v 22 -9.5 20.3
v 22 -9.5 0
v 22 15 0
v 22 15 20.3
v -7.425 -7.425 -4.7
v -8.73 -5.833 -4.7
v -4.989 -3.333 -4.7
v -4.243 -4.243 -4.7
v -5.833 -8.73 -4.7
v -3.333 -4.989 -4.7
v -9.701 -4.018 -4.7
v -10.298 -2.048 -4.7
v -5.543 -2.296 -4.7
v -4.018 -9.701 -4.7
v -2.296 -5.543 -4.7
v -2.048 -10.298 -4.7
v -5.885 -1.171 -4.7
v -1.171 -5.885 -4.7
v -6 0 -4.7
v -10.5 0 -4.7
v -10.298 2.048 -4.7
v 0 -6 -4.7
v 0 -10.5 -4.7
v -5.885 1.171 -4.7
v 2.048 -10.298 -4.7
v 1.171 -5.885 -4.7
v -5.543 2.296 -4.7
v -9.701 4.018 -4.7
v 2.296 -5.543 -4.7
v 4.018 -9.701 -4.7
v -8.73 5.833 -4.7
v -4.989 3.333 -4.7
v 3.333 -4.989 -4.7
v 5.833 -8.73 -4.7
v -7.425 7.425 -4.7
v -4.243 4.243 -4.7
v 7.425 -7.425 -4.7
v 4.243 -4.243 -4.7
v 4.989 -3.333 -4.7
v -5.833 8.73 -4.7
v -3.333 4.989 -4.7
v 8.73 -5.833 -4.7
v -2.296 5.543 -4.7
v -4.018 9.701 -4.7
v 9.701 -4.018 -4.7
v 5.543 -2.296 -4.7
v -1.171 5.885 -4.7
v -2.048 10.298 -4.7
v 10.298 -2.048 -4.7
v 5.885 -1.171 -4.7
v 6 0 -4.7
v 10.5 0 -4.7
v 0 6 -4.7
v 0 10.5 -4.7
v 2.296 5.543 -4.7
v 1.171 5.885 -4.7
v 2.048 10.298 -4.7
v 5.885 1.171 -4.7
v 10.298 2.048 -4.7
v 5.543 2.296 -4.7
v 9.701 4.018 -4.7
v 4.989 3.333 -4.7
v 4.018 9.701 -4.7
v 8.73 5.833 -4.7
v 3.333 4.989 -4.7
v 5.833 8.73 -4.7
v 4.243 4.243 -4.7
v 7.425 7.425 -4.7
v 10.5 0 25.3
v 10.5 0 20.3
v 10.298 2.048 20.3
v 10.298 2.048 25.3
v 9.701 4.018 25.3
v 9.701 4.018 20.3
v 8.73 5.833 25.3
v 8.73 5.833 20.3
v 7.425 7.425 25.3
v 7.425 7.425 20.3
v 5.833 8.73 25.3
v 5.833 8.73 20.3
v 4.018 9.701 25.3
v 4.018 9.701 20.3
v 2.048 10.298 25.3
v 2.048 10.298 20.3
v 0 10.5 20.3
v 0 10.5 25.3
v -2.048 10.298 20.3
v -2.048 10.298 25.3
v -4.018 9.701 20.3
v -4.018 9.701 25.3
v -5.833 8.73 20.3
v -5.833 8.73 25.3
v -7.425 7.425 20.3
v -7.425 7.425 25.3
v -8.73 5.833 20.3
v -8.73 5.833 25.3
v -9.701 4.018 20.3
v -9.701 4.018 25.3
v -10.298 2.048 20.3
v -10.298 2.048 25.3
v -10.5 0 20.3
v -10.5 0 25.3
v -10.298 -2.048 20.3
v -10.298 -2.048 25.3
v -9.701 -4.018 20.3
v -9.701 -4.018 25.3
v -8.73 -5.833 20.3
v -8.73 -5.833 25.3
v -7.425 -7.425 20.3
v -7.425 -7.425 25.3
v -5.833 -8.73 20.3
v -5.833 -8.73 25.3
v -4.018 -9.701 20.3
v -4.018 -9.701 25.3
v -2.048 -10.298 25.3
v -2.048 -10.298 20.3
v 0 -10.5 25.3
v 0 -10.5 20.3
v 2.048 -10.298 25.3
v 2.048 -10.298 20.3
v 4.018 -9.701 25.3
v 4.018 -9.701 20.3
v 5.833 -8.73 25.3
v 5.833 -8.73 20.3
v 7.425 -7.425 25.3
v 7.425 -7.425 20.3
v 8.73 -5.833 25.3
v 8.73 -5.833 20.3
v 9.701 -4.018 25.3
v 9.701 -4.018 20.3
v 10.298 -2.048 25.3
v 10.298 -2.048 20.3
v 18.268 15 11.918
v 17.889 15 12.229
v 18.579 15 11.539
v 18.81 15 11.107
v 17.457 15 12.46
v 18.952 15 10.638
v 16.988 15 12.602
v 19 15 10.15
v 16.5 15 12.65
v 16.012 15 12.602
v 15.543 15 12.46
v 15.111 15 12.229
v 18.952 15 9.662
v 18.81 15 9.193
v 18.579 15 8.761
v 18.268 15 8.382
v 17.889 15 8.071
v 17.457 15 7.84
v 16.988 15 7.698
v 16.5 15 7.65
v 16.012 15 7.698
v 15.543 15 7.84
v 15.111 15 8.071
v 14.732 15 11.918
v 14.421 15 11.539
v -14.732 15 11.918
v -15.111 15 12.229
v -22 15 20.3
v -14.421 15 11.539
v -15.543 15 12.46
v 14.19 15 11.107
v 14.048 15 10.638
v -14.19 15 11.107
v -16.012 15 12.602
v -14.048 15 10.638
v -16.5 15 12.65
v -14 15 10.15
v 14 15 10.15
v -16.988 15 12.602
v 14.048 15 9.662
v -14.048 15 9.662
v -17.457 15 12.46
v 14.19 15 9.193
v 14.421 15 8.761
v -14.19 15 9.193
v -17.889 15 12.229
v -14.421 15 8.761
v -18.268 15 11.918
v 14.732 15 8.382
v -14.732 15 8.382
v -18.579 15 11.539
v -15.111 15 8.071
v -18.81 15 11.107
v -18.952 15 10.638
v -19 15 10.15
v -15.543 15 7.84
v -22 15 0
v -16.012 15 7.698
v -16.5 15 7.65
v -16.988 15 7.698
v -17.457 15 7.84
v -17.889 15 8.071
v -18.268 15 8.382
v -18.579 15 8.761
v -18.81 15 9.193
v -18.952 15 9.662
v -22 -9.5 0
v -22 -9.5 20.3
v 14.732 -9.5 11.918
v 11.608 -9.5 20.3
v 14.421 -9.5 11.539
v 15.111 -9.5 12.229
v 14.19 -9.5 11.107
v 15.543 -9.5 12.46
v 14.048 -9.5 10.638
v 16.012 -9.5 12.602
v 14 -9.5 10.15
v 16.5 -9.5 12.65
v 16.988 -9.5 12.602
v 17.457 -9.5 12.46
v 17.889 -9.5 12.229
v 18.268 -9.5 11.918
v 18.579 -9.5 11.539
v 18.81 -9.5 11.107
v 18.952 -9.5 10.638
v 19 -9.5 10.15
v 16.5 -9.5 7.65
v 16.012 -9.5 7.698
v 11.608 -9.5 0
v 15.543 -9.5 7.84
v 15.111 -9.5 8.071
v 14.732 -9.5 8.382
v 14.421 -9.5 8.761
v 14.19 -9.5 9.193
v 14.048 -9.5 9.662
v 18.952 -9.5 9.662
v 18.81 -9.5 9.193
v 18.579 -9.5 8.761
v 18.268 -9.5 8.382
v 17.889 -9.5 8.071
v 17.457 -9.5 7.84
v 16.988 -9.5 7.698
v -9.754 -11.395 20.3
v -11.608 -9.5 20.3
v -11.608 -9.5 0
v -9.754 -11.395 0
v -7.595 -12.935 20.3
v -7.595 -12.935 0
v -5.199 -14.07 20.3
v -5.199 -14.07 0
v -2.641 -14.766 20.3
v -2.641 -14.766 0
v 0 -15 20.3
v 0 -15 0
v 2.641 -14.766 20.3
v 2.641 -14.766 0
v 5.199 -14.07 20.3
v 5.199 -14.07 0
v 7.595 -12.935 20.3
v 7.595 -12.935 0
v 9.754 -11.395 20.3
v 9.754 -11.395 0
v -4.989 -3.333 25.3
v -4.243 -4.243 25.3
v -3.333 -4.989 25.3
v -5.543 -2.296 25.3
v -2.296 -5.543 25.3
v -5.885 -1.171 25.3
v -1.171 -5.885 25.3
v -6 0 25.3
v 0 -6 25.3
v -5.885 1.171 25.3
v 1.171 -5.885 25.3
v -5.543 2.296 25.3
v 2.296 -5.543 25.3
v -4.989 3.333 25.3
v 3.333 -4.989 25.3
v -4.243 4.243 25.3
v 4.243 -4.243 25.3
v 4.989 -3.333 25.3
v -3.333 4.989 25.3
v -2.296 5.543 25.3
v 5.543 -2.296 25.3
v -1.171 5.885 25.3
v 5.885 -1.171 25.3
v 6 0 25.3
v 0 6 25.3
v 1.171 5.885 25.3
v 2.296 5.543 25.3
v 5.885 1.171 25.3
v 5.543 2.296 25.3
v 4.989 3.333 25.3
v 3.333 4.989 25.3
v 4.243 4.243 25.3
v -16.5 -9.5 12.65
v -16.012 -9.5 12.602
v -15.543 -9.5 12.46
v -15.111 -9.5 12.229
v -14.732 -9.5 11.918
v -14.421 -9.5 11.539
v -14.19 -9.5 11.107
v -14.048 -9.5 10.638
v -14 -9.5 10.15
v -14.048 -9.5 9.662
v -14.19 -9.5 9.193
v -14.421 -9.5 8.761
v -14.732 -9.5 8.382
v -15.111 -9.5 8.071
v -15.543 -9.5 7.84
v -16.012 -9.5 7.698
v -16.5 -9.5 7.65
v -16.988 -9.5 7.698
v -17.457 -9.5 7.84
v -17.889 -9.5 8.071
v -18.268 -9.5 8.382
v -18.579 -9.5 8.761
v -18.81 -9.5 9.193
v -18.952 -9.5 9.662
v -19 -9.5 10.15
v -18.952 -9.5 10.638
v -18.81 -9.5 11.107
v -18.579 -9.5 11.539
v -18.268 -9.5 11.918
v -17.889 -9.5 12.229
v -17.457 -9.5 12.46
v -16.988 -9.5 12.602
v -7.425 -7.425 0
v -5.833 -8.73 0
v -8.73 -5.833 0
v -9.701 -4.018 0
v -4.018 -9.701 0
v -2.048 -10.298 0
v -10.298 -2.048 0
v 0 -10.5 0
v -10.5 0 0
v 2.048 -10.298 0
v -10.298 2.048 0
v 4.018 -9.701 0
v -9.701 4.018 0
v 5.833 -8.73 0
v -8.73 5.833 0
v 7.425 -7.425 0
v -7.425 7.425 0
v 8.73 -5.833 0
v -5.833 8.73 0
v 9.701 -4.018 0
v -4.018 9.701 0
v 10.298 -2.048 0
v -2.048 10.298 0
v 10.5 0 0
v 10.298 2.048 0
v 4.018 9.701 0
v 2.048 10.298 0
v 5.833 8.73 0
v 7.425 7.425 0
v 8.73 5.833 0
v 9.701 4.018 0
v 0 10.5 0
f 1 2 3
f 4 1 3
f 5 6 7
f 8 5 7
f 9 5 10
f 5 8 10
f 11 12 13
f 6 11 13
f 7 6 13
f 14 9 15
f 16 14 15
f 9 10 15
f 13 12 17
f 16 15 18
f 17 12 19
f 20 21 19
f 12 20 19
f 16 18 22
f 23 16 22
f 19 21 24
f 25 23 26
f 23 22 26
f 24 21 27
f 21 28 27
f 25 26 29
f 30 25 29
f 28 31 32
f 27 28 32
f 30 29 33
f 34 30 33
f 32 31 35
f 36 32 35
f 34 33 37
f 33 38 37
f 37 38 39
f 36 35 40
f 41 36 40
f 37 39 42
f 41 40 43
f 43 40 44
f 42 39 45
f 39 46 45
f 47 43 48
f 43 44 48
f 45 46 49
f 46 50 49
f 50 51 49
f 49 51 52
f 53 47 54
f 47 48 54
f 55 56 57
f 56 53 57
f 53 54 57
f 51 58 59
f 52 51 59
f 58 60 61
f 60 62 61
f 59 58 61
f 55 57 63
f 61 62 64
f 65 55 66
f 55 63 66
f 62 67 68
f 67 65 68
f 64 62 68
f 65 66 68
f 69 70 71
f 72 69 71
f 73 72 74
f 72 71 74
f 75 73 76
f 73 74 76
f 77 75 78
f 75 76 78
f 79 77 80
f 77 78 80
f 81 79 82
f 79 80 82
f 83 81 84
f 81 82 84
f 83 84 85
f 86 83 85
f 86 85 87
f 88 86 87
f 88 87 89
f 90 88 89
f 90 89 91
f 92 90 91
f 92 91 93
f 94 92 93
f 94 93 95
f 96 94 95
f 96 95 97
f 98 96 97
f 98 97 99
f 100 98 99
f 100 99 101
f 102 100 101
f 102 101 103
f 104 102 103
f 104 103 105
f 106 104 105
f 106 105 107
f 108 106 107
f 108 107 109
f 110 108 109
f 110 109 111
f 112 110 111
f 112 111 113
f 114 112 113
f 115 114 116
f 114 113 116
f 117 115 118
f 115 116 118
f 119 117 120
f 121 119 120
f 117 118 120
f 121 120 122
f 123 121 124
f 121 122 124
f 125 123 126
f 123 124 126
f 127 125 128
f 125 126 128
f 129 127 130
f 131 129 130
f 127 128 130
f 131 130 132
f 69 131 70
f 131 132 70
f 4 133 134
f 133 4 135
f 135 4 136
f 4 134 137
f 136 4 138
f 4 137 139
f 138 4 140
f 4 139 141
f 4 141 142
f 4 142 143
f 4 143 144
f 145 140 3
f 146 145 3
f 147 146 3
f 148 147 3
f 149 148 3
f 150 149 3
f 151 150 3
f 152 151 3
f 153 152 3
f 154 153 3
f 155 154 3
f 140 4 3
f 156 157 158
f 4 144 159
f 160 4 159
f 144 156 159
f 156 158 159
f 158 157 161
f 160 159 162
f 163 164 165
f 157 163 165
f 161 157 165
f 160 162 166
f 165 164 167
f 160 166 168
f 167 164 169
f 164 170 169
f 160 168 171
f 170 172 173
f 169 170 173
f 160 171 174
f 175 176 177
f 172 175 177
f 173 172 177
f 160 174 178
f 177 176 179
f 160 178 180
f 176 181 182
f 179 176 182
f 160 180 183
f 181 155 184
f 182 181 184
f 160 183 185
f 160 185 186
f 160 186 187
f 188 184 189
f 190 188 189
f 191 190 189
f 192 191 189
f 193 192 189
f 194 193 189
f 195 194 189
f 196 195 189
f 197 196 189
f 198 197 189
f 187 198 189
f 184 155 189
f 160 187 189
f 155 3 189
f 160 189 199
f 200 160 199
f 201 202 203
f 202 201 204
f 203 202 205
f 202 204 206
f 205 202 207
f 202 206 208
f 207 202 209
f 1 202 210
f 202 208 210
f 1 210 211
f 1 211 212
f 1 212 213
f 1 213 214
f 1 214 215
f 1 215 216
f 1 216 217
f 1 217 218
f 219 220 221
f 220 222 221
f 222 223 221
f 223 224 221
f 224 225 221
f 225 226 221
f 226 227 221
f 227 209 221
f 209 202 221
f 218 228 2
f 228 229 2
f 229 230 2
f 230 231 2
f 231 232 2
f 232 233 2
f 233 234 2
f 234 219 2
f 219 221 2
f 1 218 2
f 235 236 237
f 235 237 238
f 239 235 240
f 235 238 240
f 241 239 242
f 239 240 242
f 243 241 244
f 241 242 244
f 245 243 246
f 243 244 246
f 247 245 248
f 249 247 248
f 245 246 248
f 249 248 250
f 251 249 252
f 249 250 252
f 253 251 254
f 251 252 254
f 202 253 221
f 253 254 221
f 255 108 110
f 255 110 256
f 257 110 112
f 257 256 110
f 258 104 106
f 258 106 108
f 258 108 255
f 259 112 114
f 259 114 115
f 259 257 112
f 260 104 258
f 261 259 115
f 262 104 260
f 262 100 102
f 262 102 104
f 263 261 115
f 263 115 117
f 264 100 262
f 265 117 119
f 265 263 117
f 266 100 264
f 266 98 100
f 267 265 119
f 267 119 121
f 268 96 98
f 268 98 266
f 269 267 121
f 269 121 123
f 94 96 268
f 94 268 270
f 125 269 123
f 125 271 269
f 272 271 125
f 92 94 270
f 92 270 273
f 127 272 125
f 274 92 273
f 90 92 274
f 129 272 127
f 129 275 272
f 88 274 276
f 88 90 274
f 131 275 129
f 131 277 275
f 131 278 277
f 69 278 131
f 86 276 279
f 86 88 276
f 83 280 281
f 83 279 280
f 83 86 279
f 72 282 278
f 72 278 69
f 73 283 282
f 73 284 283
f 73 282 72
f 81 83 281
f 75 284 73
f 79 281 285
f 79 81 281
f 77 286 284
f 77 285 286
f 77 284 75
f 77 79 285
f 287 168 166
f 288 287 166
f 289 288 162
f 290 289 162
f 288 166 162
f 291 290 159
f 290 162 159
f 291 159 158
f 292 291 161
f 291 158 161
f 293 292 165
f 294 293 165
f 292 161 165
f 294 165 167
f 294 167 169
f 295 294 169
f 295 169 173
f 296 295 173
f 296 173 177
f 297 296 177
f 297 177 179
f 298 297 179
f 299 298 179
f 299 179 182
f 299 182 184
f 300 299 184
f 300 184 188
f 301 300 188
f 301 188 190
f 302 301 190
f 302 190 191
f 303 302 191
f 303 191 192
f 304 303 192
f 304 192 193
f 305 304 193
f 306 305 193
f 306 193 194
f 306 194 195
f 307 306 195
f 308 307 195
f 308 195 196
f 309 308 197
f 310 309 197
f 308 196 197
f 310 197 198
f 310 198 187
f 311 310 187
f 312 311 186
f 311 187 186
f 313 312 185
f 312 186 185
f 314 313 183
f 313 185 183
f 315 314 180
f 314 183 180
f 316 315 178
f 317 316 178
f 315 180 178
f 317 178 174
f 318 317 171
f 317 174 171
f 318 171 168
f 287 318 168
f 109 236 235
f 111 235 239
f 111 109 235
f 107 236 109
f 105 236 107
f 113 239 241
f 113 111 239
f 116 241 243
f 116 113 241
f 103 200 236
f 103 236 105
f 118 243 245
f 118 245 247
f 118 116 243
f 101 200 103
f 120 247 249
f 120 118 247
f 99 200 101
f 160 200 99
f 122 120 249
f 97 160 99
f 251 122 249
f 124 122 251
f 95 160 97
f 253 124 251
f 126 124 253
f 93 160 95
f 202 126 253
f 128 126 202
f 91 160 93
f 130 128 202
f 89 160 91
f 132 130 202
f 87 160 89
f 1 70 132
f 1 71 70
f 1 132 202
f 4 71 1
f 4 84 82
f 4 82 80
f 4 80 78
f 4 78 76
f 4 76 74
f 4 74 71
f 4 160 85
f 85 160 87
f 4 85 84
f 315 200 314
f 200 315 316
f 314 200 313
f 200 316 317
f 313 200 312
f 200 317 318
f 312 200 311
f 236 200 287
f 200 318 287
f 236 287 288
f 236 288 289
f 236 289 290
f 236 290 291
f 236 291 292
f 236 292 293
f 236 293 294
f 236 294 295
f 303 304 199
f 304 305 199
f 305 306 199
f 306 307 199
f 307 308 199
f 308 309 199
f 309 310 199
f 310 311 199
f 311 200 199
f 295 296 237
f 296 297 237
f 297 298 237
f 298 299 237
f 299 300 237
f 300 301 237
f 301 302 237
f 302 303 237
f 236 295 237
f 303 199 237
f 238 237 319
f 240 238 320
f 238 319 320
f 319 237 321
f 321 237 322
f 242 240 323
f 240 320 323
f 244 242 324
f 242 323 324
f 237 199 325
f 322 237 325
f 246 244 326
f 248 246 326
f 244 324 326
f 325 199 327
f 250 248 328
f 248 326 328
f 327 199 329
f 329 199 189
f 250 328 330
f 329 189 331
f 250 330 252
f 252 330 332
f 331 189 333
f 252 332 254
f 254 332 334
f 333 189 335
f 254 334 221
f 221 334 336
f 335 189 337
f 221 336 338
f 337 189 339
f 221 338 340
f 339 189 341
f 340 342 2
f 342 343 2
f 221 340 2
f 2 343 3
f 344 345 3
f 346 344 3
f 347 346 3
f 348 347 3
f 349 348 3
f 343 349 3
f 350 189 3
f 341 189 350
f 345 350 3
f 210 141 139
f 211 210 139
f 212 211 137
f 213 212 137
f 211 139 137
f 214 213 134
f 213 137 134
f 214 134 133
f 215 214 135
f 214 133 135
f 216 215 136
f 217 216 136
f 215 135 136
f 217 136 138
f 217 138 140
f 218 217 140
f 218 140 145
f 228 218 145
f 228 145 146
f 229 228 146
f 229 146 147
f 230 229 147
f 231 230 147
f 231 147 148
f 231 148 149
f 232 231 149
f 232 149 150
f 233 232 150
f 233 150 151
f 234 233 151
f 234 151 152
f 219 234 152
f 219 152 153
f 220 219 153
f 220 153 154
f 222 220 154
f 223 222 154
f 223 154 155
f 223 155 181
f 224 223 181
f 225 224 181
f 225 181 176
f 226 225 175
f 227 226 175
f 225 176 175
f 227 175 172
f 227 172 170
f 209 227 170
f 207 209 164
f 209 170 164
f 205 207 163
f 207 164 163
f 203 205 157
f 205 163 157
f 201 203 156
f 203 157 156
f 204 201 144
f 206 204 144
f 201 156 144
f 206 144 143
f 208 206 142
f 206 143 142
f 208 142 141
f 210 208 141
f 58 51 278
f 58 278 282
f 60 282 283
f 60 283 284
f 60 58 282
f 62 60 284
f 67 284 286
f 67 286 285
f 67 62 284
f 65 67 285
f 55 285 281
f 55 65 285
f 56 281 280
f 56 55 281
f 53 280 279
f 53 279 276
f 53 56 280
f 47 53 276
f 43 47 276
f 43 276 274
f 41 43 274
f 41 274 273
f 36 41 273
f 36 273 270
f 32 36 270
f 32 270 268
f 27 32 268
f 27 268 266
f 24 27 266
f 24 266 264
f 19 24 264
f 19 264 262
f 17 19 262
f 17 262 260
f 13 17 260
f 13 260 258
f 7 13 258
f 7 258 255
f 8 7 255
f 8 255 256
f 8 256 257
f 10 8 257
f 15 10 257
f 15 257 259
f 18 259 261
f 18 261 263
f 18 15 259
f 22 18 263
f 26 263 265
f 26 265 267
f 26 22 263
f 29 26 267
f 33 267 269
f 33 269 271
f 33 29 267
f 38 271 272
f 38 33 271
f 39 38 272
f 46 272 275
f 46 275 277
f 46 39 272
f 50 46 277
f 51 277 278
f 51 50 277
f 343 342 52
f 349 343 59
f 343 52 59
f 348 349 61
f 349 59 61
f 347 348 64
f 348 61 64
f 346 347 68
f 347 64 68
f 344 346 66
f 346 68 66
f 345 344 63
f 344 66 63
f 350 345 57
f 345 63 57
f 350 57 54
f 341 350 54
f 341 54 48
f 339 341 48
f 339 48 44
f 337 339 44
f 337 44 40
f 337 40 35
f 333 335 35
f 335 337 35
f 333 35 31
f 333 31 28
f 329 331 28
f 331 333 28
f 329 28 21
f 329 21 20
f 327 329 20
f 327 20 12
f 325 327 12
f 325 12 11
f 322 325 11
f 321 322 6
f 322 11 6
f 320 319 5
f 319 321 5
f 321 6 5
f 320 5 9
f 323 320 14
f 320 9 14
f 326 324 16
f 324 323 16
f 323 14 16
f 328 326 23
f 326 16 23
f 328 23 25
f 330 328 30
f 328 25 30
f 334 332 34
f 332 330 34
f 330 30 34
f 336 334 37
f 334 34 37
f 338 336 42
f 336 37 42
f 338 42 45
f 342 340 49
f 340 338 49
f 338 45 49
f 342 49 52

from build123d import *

# Parameters (mm, degrees)
IZIM1_R                          = 6
Y_KSEKLIK_EKSTR_ZYON1_DEPTH      = 20.3
Y_KSEKLIK_EKSTR_ZYON2_DEPTH      = 5
Y_KSEKLIK_EKSTR_ZYON2_DEPTH_BACK = 25
IZIM2_R                          = 10.5
IZIM2_R_2                        = 6
IZIM5_R                          = 2.5
KES_EKSTR_ZYON1_DEPTH            = 45.989887753


with BuildPart() as part:
    # Çizim1 → Yükseklik-Ekstrüzyon1 (new body)
    with BuildSketch(Plane.XY):
        with BuildLine():
            Line((-22, -9.5), (-11.608186766, -9.5))
            ThreePointArc((-11.608186766, -9.5), (0, -15), (11.608186766, -9.5))
            Line((11.608186766, -9.5), (22, -9.5))
            Line((22, -9.5), (22, 15))
            Line((22, 15), (-22, 15))
            Line((-22, 15), (-22, -9.5))
        make_face()
        Circle(IZIM1_R, mode=Mode.SUBTRACT)
    extrude(amount=Y_KSEKLIK_EKSTR_ZYON1_DEPTH)

    # Çizim2 → Yükseklik-Ekstrüzyon2 (add, two sides: drawn at the far end of the back side and taken through both)
    with BuildSketch(Plane.XY.offset(20.3).offset(-Y_KSEKLIK_EKSTR_ZYON2_DEPTH_BACK)):
        Circle(IZIM2_R)
        Circle(IZIM2_R_2, mode=Mode.SUBTRACT)
    extrude(amount=Y_KSEKLIK_EKSTR_ZYON2_DEPTH + Y_KSEKLIK_EKSTR_ZYON2_DEPTH_BACK)

    # Çizim5 → Kes-Ekstrüzyon1 (cut, through all)
    with BuildSketch(Plane(origin=(0, 15, 0), x_dir=(1, 0, 0), z_dir=(0, 1, 0))):
        with Locations(Location((-16.5, -10.15, 0), (0, 0, 270))):
            Circle(IZIM5_R)
        with Locations(Location((16.5, -10.15, 0), (0, 0, 270))):
            Circle(IZIM5_R)
    extrude(amount=-KES_EKSTR_ZYON1_DEPTH, mode=Mode.SUBTRACT)


solid = part.part
